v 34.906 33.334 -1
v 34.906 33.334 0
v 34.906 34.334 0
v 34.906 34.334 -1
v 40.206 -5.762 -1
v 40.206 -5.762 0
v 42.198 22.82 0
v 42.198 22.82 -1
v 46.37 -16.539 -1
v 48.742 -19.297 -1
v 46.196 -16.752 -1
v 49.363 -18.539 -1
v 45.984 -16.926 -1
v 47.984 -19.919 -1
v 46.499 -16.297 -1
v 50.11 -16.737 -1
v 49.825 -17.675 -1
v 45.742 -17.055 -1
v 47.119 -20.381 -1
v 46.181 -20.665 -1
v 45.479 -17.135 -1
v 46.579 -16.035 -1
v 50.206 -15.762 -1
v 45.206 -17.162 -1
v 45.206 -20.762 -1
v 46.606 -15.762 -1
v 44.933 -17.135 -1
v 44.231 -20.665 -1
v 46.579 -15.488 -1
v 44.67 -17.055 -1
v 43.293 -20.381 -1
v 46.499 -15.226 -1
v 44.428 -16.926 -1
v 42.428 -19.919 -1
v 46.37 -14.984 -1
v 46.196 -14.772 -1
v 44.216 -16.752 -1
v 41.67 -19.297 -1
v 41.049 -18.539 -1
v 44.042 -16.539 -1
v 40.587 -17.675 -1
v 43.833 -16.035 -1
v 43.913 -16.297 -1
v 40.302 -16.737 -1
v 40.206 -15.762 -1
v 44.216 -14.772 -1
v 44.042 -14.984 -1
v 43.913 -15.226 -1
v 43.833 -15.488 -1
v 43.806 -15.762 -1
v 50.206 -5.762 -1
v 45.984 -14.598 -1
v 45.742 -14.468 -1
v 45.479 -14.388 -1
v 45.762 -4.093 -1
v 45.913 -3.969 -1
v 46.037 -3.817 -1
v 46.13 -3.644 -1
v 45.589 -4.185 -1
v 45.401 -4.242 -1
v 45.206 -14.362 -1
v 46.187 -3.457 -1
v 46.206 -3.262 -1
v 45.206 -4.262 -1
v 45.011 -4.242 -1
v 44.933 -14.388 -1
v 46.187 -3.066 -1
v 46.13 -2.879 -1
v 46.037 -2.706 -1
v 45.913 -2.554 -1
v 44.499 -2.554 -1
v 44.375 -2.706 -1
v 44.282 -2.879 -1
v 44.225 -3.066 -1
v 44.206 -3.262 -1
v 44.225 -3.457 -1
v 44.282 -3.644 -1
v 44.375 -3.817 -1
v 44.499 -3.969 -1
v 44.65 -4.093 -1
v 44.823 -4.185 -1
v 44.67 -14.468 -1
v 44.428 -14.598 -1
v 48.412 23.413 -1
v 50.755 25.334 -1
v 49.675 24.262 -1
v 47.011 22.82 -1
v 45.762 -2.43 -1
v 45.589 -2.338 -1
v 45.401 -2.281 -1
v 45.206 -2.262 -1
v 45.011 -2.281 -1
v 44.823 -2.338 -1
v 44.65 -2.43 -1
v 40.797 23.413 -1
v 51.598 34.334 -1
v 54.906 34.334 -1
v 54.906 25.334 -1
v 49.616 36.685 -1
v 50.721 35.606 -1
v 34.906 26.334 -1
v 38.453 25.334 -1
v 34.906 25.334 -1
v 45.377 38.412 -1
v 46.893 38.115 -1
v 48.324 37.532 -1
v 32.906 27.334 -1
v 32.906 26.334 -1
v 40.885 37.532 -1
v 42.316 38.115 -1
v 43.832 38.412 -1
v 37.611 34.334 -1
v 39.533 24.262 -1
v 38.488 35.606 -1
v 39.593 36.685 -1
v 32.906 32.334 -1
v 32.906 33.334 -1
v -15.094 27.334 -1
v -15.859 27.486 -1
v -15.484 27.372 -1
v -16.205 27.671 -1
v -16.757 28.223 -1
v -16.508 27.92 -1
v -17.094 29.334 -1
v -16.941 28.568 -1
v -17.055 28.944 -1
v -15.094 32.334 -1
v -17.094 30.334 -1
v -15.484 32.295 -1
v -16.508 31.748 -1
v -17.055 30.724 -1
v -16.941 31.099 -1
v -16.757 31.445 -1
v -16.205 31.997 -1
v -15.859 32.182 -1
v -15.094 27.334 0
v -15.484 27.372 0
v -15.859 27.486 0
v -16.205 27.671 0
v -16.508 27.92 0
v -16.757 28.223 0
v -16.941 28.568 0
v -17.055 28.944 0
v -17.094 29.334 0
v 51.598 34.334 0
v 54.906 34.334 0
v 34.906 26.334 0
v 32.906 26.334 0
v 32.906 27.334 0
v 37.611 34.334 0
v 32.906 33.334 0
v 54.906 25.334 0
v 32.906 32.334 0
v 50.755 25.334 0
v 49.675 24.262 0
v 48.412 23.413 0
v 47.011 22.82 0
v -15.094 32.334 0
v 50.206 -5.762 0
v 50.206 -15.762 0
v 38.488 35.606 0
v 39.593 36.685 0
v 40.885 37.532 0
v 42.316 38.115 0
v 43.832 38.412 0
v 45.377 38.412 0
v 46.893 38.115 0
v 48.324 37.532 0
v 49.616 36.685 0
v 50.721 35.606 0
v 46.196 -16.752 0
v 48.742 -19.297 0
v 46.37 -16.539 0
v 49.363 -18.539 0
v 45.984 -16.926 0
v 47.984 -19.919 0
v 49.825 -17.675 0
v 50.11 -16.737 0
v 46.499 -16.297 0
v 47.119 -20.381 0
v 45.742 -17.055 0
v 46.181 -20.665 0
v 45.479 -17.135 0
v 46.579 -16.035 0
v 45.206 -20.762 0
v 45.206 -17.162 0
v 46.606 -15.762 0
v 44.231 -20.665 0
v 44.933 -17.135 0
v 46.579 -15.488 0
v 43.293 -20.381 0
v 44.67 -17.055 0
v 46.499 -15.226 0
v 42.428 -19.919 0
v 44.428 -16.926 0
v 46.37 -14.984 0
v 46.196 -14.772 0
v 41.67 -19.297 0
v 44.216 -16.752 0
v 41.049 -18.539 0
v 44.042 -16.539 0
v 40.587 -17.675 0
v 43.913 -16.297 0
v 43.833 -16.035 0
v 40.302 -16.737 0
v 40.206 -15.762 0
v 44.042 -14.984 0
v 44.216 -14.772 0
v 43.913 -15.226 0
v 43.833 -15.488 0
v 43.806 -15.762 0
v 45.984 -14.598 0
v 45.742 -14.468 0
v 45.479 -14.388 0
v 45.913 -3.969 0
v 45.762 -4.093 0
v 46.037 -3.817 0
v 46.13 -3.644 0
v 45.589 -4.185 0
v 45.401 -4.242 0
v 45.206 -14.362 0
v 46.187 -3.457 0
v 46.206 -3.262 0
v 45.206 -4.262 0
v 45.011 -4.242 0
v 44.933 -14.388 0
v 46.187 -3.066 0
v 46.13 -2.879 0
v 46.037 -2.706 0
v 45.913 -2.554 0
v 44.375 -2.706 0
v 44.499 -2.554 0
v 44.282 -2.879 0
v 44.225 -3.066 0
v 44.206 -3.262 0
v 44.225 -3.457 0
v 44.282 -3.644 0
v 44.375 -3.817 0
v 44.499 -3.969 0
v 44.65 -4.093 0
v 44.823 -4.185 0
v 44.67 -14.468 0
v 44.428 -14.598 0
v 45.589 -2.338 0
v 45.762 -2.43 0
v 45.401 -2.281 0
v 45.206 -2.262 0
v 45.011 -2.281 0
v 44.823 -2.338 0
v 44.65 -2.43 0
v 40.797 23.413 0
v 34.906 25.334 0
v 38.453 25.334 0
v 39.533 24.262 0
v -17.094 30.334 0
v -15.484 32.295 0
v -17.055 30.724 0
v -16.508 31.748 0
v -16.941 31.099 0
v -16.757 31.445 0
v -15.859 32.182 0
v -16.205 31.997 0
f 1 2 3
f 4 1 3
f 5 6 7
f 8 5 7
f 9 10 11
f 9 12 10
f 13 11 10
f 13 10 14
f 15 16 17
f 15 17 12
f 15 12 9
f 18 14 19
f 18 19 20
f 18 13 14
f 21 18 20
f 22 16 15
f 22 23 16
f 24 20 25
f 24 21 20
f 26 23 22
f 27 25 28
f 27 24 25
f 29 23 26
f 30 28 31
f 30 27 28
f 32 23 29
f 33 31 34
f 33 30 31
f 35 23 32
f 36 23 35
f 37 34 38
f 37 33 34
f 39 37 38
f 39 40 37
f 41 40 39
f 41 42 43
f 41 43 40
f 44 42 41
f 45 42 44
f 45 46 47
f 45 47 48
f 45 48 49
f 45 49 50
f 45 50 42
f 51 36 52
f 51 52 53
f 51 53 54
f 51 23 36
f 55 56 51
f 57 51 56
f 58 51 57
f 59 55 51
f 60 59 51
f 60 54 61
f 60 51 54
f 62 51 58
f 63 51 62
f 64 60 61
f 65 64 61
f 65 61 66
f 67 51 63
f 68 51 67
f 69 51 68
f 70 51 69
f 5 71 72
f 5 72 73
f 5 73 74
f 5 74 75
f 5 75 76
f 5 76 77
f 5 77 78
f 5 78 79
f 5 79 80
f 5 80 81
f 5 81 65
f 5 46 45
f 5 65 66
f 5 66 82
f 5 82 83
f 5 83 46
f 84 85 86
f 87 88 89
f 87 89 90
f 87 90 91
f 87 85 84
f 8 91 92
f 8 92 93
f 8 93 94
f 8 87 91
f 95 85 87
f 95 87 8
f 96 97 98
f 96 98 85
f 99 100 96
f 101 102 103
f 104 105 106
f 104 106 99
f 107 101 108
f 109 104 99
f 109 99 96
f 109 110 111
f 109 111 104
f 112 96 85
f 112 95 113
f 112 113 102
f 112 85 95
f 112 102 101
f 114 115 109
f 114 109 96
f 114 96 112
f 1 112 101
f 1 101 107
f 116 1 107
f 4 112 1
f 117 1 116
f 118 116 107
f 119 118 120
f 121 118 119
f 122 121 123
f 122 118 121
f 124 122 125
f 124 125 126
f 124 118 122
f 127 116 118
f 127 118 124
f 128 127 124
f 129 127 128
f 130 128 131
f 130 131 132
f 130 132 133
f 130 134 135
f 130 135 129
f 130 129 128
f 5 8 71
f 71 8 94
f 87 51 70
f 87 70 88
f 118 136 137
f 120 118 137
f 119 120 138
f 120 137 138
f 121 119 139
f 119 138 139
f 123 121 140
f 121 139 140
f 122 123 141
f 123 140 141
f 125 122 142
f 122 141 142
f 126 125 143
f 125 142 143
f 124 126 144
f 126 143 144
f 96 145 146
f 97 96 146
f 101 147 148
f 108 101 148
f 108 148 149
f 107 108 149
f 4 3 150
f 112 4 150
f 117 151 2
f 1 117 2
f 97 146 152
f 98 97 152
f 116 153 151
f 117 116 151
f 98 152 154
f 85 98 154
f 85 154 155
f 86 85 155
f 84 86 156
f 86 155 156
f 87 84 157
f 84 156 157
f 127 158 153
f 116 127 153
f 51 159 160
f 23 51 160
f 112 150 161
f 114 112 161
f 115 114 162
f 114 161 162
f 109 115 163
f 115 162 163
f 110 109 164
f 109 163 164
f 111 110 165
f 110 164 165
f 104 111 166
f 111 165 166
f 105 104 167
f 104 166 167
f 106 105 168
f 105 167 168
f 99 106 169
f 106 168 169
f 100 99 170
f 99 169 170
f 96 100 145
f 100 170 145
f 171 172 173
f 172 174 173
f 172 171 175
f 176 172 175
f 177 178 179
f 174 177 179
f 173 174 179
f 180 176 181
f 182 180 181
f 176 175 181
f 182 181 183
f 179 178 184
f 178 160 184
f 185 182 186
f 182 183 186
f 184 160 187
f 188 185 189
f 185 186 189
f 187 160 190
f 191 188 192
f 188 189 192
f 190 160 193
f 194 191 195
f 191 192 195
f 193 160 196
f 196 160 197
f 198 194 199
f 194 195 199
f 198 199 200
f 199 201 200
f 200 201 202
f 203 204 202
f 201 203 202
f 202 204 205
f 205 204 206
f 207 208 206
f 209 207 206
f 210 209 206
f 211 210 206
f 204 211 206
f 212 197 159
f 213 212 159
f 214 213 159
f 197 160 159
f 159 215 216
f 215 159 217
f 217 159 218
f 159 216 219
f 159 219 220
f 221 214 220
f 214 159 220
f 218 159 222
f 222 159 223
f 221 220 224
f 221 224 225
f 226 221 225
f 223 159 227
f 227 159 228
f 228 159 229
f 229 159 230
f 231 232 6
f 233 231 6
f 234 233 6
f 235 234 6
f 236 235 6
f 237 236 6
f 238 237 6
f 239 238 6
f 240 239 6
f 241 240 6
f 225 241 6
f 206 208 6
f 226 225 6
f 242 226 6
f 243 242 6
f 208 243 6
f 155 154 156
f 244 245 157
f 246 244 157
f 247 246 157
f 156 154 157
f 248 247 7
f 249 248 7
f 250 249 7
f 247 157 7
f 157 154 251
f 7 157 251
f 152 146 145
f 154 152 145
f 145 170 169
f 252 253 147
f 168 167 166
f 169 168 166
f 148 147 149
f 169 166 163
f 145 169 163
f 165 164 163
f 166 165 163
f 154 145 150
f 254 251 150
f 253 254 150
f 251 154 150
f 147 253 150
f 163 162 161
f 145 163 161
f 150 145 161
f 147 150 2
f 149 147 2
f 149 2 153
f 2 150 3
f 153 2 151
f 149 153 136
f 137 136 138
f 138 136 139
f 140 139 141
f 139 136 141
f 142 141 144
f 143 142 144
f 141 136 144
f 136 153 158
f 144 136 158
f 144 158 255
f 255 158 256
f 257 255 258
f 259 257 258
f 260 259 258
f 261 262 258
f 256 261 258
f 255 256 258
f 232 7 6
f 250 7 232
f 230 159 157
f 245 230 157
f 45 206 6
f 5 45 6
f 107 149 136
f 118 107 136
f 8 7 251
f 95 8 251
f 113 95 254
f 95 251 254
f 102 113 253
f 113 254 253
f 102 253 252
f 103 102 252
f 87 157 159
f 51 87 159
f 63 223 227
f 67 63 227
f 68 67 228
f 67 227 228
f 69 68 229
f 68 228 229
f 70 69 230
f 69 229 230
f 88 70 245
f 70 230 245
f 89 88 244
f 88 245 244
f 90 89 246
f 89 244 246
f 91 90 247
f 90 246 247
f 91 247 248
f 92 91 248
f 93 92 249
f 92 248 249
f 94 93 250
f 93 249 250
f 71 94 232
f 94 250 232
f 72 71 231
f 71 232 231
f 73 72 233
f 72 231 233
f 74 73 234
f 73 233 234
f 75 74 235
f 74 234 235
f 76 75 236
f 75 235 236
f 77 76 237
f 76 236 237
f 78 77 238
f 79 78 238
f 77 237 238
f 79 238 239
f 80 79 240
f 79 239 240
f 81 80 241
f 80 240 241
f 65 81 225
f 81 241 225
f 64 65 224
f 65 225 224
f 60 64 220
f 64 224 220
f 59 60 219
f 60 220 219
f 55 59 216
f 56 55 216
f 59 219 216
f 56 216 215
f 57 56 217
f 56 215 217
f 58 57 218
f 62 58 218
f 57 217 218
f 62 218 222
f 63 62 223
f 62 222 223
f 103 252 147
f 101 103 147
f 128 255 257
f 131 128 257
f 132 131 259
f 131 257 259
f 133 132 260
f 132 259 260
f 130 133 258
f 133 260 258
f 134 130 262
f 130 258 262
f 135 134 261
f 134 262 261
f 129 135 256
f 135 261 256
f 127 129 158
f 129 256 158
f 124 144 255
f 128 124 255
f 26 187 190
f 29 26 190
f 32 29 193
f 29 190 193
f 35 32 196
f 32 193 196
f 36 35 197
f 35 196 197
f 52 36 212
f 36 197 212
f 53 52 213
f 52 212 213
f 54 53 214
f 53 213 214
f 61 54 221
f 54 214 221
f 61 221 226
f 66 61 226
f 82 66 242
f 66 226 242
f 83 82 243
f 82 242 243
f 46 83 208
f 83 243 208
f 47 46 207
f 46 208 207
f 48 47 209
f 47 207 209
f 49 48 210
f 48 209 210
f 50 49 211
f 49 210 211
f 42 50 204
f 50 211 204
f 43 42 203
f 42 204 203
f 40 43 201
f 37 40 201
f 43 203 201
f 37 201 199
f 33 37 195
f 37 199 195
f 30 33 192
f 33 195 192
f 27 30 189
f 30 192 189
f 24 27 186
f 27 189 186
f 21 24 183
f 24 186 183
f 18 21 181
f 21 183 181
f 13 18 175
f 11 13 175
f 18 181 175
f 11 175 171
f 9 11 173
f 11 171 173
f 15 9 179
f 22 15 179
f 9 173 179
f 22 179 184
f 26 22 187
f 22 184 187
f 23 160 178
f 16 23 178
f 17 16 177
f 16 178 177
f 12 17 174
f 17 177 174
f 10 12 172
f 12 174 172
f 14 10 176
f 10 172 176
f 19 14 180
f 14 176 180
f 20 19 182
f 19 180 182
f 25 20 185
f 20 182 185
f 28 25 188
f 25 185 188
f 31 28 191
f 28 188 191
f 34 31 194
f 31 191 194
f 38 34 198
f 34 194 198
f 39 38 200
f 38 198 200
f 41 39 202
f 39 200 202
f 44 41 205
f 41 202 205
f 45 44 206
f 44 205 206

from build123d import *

# Parameters (mm, degrees)
MODEL_R           = 1.4
MODEL_R_2         = 1
BRIDA_BASE1_DEPTH = 1


# Sheet-metal steps are written as plain solids
with BuildPart() as part:
    # Model → Brida base1 (new body)
    with BuildSketch(Plane.XY):
        with BuildLine():
            Line((40.2059904, -5.7615616), (42.197855138, 22.819737764))
            ThreePointArc((42.197855138, 22.819737764), (40.144837503, 23.807467685), (38.45349381, 25.333851753))
            Line((38.45349381, 25.333851753), (34.906389557, 25.333851753))
            Line((34.906389557, 25.333851753), (34.906389557, 26.333851753))
            Line((34.906389557, 26.333851753), (32.906389557, 26.333851753))
            Line((32.906389557, 26.333851753), (32.906389557, 27.333851753))
            Line((32.906389557, 27.333851753), (-15.093610443, 27.333851753))
            ThreePointArc((-15.093610443, 27.333851753), (-16.507824005, 27.919638191), (-17.093610443, 29.333851753))
            Line((-17.093610443, 29.333851753), (-17.093610443, 30.333851753))
            ThreePointArc((-17.093610443, 30.333851753), (-16.507824005, 31.748065316), (-15.093610443, 32.333851753))
            Line((-15.093610443, 32.333851753), (32.906389557, 32.333851753))
            Line((32.906389557, 32.333851753), (32.906389557, 33.333851753))
            Line((32.906389557, 33.333851753), (34.906389557, 33.333851753))
            Line((34.906389557, 33.333851753), (34.906389557, 34.333851753))
            Line((34.906389557, 34.333851753), (37.610831115, 34.333851753))
            ThreePointArc((37.610831115, 34.333851753), (44.604363348, 38.449201588), (51.597895581, 34.333851753))
            Line((51.597895581, 34.333851753), (54.906389557, 34.333851753))
            Line((54.906389557, 34.333851753), (54.906389557, 25.333851753))
            Line((54.906389557, 25.333851753), (50.755232885, 25.333851753))
            ThreePointArc((50.755232885, 25.333851753), (49.063889193, 23.807467685), (47.010871557, 22.819737764))
            Line((47.010871557, 22.819737764), (50.2059904, -5.7615616))
            Line((50.2059904, -5.7615616), (50.2059904, -15.7615616))
            ThreePointArc((50.2059904, -15.7615616), (45.2059904, -20.7615616), (40.2059904, -15.7615616))
            Line((40.2059904, -15.7615616), (40.2059904, -5.7615616))
        make_face()
        with Locations((45.2059904, -15.7615616)):
            Circle(MODEL_R, mode=Mode.SUBTRACT)
        with Locations((45.2059904, -3.2615616)):
            Circle(MODEL_R_2, mode=Mode.SUBTRACT)
    extrude(amount=-BRIDA_BASE1_DEPTH)


solid = part.part
